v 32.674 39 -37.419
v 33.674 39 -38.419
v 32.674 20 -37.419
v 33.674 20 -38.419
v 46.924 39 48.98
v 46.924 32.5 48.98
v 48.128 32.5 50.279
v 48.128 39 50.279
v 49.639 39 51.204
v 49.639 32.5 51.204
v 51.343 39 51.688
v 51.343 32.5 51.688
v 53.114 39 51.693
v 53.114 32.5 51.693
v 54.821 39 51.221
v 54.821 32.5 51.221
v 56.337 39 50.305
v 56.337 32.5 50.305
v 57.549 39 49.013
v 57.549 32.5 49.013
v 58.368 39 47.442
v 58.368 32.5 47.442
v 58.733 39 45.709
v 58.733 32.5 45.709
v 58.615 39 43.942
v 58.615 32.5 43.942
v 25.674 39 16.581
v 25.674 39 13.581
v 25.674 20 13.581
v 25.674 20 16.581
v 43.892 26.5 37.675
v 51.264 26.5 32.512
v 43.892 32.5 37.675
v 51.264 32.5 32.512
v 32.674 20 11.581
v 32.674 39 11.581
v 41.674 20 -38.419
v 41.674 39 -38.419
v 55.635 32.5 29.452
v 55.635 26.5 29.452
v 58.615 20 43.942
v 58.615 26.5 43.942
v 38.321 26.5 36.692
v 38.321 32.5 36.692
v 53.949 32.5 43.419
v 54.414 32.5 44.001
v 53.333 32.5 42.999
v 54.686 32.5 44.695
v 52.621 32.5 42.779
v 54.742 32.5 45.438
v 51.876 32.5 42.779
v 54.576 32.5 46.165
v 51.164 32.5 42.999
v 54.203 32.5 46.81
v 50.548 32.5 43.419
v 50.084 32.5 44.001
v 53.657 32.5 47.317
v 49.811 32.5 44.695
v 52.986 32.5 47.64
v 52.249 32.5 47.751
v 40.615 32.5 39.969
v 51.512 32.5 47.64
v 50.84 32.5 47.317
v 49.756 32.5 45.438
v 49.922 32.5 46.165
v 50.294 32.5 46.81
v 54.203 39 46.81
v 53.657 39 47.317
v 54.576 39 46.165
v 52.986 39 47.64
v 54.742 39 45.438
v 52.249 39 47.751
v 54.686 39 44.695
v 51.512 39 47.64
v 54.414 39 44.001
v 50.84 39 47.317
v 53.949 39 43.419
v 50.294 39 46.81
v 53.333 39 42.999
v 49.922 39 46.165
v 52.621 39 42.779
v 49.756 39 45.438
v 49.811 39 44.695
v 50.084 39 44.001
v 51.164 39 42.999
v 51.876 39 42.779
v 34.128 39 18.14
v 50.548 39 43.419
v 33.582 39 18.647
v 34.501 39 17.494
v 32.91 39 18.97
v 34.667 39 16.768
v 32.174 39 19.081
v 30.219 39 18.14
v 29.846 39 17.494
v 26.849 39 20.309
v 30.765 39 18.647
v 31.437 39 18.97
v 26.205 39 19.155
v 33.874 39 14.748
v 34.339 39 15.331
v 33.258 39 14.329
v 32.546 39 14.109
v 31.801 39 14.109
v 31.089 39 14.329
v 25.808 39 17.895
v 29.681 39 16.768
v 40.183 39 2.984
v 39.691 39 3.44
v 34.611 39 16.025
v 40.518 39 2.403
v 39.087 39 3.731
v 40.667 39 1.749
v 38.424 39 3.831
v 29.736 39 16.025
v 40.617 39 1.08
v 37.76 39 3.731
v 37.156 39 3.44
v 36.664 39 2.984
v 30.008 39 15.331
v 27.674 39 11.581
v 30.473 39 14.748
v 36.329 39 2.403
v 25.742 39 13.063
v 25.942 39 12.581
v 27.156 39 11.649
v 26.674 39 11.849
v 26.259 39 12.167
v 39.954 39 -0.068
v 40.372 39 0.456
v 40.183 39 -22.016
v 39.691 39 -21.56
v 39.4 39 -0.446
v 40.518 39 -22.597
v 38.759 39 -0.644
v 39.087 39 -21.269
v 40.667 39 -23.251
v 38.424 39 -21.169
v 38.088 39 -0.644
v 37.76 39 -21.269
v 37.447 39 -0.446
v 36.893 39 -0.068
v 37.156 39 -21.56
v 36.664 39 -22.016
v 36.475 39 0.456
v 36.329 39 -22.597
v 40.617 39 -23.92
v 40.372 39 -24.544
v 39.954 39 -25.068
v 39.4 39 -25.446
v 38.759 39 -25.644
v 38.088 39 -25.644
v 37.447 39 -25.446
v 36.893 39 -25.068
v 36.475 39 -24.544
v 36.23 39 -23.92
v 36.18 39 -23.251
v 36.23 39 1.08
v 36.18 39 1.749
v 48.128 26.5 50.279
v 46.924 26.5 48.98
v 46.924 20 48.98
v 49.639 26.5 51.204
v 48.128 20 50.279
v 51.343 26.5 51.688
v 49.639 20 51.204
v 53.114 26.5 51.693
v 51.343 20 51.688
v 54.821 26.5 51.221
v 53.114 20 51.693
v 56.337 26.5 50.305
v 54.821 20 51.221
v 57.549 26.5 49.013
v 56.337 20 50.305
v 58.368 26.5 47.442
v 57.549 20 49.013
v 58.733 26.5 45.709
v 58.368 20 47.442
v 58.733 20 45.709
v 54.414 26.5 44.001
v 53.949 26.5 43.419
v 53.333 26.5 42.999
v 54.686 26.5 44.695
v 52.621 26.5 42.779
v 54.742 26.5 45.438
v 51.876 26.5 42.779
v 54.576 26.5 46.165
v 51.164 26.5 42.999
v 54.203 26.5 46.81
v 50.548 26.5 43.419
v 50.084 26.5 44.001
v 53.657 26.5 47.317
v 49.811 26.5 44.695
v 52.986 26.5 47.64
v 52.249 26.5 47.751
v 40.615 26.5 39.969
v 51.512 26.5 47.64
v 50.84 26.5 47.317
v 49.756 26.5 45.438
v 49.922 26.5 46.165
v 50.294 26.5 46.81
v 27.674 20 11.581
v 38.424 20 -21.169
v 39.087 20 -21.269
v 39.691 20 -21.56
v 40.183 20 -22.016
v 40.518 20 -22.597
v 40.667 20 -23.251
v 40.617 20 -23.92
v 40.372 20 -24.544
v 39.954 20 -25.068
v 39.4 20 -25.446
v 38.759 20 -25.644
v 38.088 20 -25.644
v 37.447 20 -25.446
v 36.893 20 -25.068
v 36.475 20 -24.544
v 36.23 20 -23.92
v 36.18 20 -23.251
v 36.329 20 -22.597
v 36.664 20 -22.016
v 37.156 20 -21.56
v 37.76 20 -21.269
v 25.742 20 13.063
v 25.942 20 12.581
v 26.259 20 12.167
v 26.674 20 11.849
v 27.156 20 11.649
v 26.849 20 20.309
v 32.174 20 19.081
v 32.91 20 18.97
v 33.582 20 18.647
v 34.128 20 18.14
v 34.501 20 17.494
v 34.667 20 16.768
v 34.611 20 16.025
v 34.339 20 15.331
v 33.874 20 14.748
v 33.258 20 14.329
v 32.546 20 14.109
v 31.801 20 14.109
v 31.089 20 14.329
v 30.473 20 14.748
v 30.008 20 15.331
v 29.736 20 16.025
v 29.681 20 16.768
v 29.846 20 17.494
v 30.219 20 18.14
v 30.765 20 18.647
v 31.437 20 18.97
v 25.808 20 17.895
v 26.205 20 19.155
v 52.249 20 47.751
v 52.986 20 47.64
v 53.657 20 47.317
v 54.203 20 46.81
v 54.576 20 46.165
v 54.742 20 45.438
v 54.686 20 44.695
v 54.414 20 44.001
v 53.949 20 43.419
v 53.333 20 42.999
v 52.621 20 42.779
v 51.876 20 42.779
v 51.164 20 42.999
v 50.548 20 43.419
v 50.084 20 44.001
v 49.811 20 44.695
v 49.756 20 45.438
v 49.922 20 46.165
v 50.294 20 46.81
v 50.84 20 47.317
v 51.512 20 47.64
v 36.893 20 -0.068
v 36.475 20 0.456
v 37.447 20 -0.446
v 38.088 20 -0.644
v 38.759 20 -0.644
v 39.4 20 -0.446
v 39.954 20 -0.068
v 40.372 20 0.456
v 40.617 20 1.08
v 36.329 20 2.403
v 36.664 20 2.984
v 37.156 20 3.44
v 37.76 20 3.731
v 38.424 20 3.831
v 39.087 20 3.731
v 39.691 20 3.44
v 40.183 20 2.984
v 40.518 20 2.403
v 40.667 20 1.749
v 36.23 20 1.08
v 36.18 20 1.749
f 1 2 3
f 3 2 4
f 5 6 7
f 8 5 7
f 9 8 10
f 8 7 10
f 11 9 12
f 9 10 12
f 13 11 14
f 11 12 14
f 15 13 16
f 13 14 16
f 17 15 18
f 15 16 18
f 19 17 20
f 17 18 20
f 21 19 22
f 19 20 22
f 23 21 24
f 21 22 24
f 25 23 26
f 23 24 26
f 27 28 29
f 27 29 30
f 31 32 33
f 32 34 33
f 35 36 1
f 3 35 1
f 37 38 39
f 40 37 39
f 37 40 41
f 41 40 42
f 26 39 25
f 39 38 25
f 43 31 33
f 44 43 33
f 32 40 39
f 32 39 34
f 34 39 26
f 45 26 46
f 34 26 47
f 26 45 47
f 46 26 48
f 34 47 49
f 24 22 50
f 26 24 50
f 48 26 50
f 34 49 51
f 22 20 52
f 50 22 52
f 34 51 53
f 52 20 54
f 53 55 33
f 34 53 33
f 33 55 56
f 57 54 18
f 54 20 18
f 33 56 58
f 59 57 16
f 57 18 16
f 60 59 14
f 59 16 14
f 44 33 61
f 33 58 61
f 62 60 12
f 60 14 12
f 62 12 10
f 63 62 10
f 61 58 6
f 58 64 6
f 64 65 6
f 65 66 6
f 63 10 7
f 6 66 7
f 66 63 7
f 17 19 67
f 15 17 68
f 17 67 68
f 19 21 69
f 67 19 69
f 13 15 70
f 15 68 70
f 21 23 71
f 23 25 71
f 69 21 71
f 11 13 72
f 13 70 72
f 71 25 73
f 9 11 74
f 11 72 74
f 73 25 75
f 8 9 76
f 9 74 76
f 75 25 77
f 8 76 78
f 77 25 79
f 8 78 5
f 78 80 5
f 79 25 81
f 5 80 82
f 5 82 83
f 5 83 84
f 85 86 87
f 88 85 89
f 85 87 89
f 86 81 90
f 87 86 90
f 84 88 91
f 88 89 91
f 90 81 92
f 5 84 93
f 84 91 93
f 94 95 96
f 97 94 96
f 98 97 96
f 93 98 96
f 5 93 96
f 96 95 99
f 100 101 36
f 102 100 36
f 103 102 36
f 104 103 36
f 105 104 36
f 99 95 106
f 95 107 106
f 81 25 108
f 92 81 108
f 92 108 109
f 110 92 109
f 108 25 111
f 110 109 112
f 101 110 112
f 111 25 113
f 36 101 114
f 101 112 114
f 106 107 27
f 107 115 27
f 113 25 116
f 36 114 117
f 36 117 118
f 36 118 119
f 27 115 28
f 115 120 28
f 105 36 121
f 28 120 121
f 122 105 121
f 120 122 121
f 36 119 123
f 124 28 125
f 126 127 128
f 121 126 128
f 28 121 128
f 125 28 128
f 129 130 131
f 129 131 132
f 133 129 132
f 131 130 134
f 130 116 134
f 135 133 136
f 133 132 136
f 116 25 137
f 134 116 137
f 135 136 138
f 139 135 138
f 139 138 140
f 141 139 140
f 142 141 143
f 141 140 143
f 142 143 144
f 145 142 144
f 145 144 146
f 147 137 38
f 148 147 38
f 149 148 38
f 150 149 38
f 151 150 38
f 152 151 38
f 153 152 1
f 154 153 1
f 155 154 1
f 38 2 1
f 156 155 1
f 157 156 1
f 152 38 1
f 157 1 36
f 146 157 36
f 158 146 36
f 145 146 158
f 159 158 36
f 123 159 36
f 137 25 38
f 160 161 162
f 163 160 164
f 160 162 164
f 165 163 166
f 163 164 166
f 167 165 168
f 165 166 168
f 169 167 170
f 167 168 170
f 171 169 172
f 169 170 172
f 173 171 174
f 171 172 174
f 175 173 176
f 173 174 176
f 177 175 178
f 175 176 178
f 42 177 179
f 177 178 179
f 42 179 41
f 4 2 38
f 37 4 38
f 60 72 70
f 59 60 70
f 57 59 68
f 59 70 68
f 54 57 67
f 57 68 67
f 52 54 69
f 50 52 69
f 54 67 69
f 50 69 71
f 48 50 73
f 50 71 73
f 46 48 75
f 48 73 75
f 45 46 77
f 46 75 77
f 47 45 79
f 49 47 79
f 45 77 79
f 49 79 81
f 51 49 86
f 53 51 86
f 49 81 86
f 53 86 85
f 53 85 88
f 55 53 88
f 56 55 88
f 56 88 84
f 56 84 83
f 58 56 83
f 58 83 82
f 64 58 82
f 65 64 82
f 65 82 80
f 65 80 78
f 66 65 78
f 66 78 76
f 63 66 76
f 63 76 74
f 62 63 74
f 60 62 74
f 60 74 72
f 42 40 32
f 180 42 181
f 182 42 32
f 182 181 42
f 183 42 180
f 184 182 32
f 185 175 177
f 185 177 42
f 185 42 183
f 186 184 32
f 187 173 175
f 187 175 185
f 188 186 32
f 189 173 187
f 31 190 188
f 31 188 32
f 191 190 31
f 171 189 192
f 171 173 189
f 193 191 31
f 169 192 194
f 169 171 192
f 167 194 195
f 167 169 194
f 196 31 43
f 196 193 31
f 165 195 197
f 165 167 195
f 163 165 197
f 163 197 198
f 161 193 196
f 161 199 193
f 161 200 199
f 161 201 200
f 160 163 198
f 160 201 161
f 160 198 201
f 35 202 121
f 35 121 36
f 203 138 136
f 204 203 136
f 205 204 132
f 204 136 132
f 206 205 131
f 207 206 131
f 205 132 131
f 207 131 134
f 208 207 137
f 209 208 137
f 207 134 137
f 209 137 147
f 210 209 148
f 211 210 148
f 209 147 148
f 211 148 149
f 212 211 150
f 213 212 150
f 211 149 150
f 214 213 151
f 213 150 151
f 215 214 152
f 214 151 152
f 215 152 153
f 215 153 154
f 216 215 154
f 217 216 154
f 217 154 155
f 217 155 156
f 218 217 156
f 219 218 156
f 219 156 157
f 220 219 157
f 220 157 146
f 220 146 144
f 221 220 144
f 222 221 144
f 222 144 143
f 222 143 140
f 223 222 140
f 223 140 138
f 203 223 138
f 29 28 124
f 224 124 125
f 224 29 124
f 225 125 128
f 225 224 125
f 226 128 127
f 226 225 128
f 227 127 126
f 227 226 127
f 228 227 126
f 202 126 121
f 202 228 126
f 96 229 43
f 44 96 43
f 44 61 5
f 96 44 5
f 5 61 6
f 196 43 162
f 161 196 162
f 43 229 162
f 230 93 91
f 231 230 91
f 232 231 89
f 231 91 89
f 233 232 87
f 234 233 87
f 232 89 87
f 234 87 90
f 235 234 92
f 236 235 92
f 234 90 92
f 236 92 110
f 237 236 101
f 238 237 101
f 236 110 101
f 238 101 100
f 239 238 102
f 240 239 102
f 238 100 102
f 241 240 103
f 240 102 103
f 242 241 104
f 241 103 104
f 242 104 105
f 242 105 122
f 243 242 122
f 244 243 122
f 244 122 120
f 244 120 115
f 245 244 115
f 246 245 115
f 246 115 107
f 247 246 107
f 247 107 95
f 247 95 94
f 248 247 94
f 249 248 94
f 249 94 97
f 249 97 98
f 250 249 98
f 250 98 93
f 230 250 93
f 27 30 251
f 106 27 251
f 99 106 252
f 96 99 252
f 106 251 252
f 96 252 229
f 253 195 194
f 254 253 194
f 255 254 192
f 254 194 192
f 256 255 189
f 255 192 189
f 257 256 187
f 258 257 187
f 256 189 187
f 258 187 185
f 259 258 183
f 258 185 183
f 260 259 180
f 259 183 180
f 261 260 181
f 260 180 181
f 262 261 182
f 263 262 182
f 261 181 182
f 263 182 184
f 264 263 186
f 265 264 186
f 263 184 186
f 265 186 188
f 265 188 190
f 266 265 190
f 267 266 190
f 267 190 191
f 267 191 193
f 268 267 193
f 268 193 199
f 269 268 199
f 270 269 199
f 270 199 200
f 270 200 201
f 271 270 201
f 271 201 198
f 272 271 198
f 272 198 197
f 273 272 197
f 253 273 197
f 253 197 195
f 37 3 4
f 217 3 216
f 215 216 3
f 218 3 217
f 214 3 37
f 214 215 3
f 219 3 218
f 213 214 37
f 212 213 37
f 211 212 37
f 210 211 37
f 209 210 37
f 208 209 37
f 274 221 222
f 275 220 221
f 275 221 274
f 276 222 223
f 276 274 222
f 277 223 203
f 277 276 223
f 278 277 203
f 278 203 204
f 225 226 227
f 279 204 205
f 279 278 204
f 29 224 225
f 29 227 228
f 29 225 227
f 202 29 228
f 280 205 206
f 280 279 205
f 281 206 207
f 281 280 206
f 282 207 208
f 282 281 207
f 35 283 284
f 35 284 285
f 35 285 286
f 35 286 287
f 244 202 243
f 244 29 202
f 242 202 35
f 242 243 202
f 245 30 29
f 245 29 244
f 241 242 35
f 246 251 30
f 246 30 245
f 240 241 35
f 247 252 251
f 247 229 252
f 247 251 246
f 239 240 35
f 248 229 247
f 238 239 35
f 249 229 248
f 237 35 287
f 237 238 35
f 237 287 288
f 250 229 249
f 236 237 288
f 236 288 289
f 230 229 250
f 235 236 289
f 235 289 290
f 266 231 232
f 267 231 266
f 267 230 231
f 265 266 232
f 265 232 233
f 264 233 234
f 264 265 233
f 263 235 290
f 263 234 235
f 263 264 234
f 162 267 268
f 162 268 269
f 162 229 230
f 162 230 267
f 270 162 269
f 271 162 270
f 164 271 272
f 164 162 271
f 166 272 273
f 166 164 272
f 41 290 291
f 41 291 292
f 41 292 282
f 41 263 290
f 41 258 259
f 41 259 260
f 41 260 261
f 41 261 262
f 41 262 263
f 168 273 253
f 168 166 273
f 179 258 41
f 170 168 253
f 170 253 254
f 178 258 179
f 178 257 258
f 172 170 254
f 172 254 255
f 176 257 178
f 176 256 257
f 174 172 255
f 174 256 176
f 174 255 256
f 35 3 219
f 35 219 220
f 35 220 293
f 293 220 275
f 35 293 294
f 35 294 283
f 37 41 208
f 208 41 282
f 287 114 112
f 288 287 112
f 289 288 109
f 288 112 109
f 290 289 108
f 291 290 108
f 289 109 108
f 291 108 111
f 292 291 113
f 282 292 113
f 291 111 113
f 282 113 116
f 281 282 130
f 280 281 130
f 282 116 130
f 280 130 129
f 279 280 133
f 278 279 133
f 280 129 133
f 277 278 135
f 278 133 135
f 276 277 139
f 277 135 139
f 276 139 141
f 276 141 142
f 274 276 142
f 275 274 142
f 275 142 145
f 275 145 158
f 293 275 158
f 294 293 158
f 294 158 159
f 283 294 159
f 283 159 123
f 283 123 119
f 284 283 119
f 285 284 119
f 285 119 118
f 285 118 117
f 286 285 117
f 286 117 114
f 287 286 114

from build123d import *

# Parameters (mm, degrees)
BOSS_EXTRU_2_DEPTH      = 19
ESQUISSE3_R             = 2.5
ENL_V_MAT_EXTRU_1_DEPTH = 81.564305533
ENL_V_MAT_EXTRU_2_DEPTH = 3
CHANFREIN1_SIZE         = 4
ESQUISSE7_W             = 7
ESQUISSE7_H             = 50
ENL_V_MAT_EXTRU_4_DEPTH = 19
BOSS_EXTRU_3_REACH      = 82.564
ENL_V_START             = 6
ENL_V_MAT_EXTRU_7_DEPTH = 6
CONG_2_R                = 2
CHANFREIN2_SIZE         = 1
ESQUISSE9_R             = 2.25
ENL_V_MAT_EXTRU_5_DEPTH = 81.564305533


with BuildPart() as part:
    # Esquisse1 → Boss.-Extru.2 (new body)
    with BuildSketch(Plane(origin=(0, 20, 0), x_dir=(1, 0, 0), z_dir=(0, 1, 0))):
        with BuildLine():
            Line((25.673562069, 38.419058892), (25.673562069, -16.580941108))
            ThreePointArc((25.673562069, -16.580941108), (25.974401889, -18.535528805), (26.849073781, -20.309187945))
            Line((26.849073781, -20.309187945), (46.924249054, -48.979509495))
            ThreePointArc((46.924249054, -48.979509495), (55.976984178, -50.575750946), (57.573225629, -41.523015822))
            Line((57.573225629, -41.523015822), (39.758649804, -16.081164865))
            ThreePointArc((39.758649804, -16.081164865), (38.951260365, -14.443941044), (38.673562069, -12.639706247))
            Line((38.673562069, -12.639706247), (38.673562069, 38.419058892))
            Line((38.673562069, 38.419058892), (25.673562069, 38.419058892))
        make_face()
    extrude(amount=BOSS_EXTRU_2_DEPTH)

    # Esquisse3 → Enlèv. mat.-Extru.1 (cut, through all)
    with BuildSketch(Plane(origin=(0, 39, 0), x_dir=(1, 0, 0), z_dir=(0, 1, 0))):
        with Locations(Location((32.173562069, -16.580941108, 0), (0, 0, 270))):
            Circle(ESQUISSE3_R)
        with Locations(Location((52.248737342, -45.251262658, 0), (0, 0, 270))):
            Circle(ESQUISSE3_R)
    extrude(amount=-ENL_V_MAT_EXTRU_1_DEPTH, mode=Mode.SUBTRACT)

    # Esquisse4 → Enlèv. mat.-Extru.2 (cut, symmetric)
    with BuildSketch(Plane(origin=(0, 29.5, 0), x_dir=(1, 0, 0), z_dir=(0, 1, 0))):
        with BuildLine():
            Line((57.573225629, -41.523015822), (51.26388483, -32.512343335))
            Line((51.26388483, -32.512343335), (40.614908254, -39.968837008))
            Line((40.614908254, -39.968837008), (46.924249054, -48.979509495))
            ThreePointArc((46.924249054, -48.979509495), (55.976984178, -50.575750946), (57.573225629, -41.523015822))
        make_face()
    extrude(amount=ENL_V_MAT_EXTRU_2_DEPTH, both=True, mode=Mode.SUBTRACT)

    # Chanfrein1
    chanfrein1_edges = [part.edges().sort_by_distance(p)[0] for p in [
        (40.614908254, 29.5, 39.968837008),
    ]]
    chamfer(chanfrein1_edges, length=CHANFREIN1_SIZE)

    # Esquisse7 → Enlèv. mat.-Extru.4 (cut)
    with BuildSketch(Plane(origin=(0, 39, 0), x_dir=(1, 0, 0), z_dir=(0, 1, 0))):
        with Locations((29.173562069, 13.419058892)):
            Rectangle(ESQUISSE7_W, ESQUISSE7_H)
    extrude(amount=-ENL_V_MAT_EXTRU_4_DEPTH, mode=Mode.SUBTRACT)

    # Boss.-Extru.3: up to this face of the body (flat: up to its plane)
    boss_extru_3_end = Plane(part.part.faces().sort_by_distance((29.173562069, 20, 12.541391737))[0])
    # Esquisse8 → Boss.-Extru.3 (add, up to the picked face)
    with BuildSketch(Plane(origin=(0, 39, 0), x_dir=(1, 0, 0), z_dir=(0, 1, 0)), mode=Mode.PRIVATE) as boss_extru_3_sk1:
        with BuildLine():
            Line((38.673562069, 38.419058892), (41.673562069, 38.419058892))
            Line((41.673562069, 38.419058892), (58.615433045, -43.941611626))
            Line((58.615433045, -43.941611626), (57.573225629, -43.941611626))
            Line((57.573225629, -43.941611626), (57.573225629, -41.523015822))
            Line((57.573225629, -41.523015822), (39.758649804, -16.081164865))
            ThreePointArc((39.758649804, -16.081164865), (38.951260365, -14.443941044), (38.673562069, -12.639706247))
            Line((38.673562069, -12.639706247), (38.673562069, 38.419058892))
        make_face()
    boss_extru_3_tool1 = split(extrude(boss_extru_3_sk1.sketch, amount=-BOSS_EXTRU_3_REACH, mode=Mode.PRIVATE), bisect_by=boss_extru_3_end, keep=Keep.BOTH, mode=Mode.PRIVATE)
    add(boss_extru_3_tool1.solids().sort_by(Axis((45.454981, 39, 2.99996), (0, -1, 0)))[0])

    # Esquisse11 → Enlèv. mat.-Extru.7 (cut)
    with BuildSketch(Plane.XZ.offset(-32.5).offset(ENL_V_START)):
        with BuildLine():
            Line((51.26388483, 32.512343335), (43.891516431, 37.674531262))
            Line((43.891516431, 37.674531262), (38.320602508, 36.69222883))
            Line((38.320602508, 36.69222883), (46.924249054, 48.979509495))
            ThreePointArc((46.924249054, 48.979509495), (54.821022864, 51.220630062), (58.615433045, 43.941611626))
            Line((58.615433045, 43.941611626), (55.634824859, 29.451778178))
            Line((55.634824859, 29.451778178), (51.26388483, 32.512343335))
        make_face()
    extrude(amount=-ENL_V_MAT_EXTRU_7_DEPTH, mode=Mode.SUBTRACT)

    # Congé2
    cong_2_edges = [part.edges().sort_by_distance(p)[0] for p in [
        (25.673562069, 29.5, 11.580941108),
    ]]
    fillet(cong_2_edges, radius=CONG_2_R)

    # Chanfrein2
    chanfrein2_edges = [part.edges().sort_by_distance(p)[0] for p in [
        (32.673562069, 29.5, -38.419058892),
    ]]
    chamfer(chanfrein2_edges, length=CHANFREIN2_SIZE)

    # Esquisse9 → Enlèv. mat.-Extru.5 (cut, through all)
    with BuildSketch(Plane(origin=(0, 39, 0), x_dir=(1, 0, 0), z_dir=(0, 1, 0))):
        with Locations(Location((38.423562069, 23.419058892, 0), (0, 0, 270))):
            Circle(ESQUISSE9_R)
        with Locations(Location((38.423562069, -1.580941108, 0), (0, 0, 270))):
            Circle(ESQUISSE9_R)
    extrude(amount=-ENL_V_MAT_EXTRU_5_DEPTH, mode=Mode.SUBTRACT)


solid = part.part
